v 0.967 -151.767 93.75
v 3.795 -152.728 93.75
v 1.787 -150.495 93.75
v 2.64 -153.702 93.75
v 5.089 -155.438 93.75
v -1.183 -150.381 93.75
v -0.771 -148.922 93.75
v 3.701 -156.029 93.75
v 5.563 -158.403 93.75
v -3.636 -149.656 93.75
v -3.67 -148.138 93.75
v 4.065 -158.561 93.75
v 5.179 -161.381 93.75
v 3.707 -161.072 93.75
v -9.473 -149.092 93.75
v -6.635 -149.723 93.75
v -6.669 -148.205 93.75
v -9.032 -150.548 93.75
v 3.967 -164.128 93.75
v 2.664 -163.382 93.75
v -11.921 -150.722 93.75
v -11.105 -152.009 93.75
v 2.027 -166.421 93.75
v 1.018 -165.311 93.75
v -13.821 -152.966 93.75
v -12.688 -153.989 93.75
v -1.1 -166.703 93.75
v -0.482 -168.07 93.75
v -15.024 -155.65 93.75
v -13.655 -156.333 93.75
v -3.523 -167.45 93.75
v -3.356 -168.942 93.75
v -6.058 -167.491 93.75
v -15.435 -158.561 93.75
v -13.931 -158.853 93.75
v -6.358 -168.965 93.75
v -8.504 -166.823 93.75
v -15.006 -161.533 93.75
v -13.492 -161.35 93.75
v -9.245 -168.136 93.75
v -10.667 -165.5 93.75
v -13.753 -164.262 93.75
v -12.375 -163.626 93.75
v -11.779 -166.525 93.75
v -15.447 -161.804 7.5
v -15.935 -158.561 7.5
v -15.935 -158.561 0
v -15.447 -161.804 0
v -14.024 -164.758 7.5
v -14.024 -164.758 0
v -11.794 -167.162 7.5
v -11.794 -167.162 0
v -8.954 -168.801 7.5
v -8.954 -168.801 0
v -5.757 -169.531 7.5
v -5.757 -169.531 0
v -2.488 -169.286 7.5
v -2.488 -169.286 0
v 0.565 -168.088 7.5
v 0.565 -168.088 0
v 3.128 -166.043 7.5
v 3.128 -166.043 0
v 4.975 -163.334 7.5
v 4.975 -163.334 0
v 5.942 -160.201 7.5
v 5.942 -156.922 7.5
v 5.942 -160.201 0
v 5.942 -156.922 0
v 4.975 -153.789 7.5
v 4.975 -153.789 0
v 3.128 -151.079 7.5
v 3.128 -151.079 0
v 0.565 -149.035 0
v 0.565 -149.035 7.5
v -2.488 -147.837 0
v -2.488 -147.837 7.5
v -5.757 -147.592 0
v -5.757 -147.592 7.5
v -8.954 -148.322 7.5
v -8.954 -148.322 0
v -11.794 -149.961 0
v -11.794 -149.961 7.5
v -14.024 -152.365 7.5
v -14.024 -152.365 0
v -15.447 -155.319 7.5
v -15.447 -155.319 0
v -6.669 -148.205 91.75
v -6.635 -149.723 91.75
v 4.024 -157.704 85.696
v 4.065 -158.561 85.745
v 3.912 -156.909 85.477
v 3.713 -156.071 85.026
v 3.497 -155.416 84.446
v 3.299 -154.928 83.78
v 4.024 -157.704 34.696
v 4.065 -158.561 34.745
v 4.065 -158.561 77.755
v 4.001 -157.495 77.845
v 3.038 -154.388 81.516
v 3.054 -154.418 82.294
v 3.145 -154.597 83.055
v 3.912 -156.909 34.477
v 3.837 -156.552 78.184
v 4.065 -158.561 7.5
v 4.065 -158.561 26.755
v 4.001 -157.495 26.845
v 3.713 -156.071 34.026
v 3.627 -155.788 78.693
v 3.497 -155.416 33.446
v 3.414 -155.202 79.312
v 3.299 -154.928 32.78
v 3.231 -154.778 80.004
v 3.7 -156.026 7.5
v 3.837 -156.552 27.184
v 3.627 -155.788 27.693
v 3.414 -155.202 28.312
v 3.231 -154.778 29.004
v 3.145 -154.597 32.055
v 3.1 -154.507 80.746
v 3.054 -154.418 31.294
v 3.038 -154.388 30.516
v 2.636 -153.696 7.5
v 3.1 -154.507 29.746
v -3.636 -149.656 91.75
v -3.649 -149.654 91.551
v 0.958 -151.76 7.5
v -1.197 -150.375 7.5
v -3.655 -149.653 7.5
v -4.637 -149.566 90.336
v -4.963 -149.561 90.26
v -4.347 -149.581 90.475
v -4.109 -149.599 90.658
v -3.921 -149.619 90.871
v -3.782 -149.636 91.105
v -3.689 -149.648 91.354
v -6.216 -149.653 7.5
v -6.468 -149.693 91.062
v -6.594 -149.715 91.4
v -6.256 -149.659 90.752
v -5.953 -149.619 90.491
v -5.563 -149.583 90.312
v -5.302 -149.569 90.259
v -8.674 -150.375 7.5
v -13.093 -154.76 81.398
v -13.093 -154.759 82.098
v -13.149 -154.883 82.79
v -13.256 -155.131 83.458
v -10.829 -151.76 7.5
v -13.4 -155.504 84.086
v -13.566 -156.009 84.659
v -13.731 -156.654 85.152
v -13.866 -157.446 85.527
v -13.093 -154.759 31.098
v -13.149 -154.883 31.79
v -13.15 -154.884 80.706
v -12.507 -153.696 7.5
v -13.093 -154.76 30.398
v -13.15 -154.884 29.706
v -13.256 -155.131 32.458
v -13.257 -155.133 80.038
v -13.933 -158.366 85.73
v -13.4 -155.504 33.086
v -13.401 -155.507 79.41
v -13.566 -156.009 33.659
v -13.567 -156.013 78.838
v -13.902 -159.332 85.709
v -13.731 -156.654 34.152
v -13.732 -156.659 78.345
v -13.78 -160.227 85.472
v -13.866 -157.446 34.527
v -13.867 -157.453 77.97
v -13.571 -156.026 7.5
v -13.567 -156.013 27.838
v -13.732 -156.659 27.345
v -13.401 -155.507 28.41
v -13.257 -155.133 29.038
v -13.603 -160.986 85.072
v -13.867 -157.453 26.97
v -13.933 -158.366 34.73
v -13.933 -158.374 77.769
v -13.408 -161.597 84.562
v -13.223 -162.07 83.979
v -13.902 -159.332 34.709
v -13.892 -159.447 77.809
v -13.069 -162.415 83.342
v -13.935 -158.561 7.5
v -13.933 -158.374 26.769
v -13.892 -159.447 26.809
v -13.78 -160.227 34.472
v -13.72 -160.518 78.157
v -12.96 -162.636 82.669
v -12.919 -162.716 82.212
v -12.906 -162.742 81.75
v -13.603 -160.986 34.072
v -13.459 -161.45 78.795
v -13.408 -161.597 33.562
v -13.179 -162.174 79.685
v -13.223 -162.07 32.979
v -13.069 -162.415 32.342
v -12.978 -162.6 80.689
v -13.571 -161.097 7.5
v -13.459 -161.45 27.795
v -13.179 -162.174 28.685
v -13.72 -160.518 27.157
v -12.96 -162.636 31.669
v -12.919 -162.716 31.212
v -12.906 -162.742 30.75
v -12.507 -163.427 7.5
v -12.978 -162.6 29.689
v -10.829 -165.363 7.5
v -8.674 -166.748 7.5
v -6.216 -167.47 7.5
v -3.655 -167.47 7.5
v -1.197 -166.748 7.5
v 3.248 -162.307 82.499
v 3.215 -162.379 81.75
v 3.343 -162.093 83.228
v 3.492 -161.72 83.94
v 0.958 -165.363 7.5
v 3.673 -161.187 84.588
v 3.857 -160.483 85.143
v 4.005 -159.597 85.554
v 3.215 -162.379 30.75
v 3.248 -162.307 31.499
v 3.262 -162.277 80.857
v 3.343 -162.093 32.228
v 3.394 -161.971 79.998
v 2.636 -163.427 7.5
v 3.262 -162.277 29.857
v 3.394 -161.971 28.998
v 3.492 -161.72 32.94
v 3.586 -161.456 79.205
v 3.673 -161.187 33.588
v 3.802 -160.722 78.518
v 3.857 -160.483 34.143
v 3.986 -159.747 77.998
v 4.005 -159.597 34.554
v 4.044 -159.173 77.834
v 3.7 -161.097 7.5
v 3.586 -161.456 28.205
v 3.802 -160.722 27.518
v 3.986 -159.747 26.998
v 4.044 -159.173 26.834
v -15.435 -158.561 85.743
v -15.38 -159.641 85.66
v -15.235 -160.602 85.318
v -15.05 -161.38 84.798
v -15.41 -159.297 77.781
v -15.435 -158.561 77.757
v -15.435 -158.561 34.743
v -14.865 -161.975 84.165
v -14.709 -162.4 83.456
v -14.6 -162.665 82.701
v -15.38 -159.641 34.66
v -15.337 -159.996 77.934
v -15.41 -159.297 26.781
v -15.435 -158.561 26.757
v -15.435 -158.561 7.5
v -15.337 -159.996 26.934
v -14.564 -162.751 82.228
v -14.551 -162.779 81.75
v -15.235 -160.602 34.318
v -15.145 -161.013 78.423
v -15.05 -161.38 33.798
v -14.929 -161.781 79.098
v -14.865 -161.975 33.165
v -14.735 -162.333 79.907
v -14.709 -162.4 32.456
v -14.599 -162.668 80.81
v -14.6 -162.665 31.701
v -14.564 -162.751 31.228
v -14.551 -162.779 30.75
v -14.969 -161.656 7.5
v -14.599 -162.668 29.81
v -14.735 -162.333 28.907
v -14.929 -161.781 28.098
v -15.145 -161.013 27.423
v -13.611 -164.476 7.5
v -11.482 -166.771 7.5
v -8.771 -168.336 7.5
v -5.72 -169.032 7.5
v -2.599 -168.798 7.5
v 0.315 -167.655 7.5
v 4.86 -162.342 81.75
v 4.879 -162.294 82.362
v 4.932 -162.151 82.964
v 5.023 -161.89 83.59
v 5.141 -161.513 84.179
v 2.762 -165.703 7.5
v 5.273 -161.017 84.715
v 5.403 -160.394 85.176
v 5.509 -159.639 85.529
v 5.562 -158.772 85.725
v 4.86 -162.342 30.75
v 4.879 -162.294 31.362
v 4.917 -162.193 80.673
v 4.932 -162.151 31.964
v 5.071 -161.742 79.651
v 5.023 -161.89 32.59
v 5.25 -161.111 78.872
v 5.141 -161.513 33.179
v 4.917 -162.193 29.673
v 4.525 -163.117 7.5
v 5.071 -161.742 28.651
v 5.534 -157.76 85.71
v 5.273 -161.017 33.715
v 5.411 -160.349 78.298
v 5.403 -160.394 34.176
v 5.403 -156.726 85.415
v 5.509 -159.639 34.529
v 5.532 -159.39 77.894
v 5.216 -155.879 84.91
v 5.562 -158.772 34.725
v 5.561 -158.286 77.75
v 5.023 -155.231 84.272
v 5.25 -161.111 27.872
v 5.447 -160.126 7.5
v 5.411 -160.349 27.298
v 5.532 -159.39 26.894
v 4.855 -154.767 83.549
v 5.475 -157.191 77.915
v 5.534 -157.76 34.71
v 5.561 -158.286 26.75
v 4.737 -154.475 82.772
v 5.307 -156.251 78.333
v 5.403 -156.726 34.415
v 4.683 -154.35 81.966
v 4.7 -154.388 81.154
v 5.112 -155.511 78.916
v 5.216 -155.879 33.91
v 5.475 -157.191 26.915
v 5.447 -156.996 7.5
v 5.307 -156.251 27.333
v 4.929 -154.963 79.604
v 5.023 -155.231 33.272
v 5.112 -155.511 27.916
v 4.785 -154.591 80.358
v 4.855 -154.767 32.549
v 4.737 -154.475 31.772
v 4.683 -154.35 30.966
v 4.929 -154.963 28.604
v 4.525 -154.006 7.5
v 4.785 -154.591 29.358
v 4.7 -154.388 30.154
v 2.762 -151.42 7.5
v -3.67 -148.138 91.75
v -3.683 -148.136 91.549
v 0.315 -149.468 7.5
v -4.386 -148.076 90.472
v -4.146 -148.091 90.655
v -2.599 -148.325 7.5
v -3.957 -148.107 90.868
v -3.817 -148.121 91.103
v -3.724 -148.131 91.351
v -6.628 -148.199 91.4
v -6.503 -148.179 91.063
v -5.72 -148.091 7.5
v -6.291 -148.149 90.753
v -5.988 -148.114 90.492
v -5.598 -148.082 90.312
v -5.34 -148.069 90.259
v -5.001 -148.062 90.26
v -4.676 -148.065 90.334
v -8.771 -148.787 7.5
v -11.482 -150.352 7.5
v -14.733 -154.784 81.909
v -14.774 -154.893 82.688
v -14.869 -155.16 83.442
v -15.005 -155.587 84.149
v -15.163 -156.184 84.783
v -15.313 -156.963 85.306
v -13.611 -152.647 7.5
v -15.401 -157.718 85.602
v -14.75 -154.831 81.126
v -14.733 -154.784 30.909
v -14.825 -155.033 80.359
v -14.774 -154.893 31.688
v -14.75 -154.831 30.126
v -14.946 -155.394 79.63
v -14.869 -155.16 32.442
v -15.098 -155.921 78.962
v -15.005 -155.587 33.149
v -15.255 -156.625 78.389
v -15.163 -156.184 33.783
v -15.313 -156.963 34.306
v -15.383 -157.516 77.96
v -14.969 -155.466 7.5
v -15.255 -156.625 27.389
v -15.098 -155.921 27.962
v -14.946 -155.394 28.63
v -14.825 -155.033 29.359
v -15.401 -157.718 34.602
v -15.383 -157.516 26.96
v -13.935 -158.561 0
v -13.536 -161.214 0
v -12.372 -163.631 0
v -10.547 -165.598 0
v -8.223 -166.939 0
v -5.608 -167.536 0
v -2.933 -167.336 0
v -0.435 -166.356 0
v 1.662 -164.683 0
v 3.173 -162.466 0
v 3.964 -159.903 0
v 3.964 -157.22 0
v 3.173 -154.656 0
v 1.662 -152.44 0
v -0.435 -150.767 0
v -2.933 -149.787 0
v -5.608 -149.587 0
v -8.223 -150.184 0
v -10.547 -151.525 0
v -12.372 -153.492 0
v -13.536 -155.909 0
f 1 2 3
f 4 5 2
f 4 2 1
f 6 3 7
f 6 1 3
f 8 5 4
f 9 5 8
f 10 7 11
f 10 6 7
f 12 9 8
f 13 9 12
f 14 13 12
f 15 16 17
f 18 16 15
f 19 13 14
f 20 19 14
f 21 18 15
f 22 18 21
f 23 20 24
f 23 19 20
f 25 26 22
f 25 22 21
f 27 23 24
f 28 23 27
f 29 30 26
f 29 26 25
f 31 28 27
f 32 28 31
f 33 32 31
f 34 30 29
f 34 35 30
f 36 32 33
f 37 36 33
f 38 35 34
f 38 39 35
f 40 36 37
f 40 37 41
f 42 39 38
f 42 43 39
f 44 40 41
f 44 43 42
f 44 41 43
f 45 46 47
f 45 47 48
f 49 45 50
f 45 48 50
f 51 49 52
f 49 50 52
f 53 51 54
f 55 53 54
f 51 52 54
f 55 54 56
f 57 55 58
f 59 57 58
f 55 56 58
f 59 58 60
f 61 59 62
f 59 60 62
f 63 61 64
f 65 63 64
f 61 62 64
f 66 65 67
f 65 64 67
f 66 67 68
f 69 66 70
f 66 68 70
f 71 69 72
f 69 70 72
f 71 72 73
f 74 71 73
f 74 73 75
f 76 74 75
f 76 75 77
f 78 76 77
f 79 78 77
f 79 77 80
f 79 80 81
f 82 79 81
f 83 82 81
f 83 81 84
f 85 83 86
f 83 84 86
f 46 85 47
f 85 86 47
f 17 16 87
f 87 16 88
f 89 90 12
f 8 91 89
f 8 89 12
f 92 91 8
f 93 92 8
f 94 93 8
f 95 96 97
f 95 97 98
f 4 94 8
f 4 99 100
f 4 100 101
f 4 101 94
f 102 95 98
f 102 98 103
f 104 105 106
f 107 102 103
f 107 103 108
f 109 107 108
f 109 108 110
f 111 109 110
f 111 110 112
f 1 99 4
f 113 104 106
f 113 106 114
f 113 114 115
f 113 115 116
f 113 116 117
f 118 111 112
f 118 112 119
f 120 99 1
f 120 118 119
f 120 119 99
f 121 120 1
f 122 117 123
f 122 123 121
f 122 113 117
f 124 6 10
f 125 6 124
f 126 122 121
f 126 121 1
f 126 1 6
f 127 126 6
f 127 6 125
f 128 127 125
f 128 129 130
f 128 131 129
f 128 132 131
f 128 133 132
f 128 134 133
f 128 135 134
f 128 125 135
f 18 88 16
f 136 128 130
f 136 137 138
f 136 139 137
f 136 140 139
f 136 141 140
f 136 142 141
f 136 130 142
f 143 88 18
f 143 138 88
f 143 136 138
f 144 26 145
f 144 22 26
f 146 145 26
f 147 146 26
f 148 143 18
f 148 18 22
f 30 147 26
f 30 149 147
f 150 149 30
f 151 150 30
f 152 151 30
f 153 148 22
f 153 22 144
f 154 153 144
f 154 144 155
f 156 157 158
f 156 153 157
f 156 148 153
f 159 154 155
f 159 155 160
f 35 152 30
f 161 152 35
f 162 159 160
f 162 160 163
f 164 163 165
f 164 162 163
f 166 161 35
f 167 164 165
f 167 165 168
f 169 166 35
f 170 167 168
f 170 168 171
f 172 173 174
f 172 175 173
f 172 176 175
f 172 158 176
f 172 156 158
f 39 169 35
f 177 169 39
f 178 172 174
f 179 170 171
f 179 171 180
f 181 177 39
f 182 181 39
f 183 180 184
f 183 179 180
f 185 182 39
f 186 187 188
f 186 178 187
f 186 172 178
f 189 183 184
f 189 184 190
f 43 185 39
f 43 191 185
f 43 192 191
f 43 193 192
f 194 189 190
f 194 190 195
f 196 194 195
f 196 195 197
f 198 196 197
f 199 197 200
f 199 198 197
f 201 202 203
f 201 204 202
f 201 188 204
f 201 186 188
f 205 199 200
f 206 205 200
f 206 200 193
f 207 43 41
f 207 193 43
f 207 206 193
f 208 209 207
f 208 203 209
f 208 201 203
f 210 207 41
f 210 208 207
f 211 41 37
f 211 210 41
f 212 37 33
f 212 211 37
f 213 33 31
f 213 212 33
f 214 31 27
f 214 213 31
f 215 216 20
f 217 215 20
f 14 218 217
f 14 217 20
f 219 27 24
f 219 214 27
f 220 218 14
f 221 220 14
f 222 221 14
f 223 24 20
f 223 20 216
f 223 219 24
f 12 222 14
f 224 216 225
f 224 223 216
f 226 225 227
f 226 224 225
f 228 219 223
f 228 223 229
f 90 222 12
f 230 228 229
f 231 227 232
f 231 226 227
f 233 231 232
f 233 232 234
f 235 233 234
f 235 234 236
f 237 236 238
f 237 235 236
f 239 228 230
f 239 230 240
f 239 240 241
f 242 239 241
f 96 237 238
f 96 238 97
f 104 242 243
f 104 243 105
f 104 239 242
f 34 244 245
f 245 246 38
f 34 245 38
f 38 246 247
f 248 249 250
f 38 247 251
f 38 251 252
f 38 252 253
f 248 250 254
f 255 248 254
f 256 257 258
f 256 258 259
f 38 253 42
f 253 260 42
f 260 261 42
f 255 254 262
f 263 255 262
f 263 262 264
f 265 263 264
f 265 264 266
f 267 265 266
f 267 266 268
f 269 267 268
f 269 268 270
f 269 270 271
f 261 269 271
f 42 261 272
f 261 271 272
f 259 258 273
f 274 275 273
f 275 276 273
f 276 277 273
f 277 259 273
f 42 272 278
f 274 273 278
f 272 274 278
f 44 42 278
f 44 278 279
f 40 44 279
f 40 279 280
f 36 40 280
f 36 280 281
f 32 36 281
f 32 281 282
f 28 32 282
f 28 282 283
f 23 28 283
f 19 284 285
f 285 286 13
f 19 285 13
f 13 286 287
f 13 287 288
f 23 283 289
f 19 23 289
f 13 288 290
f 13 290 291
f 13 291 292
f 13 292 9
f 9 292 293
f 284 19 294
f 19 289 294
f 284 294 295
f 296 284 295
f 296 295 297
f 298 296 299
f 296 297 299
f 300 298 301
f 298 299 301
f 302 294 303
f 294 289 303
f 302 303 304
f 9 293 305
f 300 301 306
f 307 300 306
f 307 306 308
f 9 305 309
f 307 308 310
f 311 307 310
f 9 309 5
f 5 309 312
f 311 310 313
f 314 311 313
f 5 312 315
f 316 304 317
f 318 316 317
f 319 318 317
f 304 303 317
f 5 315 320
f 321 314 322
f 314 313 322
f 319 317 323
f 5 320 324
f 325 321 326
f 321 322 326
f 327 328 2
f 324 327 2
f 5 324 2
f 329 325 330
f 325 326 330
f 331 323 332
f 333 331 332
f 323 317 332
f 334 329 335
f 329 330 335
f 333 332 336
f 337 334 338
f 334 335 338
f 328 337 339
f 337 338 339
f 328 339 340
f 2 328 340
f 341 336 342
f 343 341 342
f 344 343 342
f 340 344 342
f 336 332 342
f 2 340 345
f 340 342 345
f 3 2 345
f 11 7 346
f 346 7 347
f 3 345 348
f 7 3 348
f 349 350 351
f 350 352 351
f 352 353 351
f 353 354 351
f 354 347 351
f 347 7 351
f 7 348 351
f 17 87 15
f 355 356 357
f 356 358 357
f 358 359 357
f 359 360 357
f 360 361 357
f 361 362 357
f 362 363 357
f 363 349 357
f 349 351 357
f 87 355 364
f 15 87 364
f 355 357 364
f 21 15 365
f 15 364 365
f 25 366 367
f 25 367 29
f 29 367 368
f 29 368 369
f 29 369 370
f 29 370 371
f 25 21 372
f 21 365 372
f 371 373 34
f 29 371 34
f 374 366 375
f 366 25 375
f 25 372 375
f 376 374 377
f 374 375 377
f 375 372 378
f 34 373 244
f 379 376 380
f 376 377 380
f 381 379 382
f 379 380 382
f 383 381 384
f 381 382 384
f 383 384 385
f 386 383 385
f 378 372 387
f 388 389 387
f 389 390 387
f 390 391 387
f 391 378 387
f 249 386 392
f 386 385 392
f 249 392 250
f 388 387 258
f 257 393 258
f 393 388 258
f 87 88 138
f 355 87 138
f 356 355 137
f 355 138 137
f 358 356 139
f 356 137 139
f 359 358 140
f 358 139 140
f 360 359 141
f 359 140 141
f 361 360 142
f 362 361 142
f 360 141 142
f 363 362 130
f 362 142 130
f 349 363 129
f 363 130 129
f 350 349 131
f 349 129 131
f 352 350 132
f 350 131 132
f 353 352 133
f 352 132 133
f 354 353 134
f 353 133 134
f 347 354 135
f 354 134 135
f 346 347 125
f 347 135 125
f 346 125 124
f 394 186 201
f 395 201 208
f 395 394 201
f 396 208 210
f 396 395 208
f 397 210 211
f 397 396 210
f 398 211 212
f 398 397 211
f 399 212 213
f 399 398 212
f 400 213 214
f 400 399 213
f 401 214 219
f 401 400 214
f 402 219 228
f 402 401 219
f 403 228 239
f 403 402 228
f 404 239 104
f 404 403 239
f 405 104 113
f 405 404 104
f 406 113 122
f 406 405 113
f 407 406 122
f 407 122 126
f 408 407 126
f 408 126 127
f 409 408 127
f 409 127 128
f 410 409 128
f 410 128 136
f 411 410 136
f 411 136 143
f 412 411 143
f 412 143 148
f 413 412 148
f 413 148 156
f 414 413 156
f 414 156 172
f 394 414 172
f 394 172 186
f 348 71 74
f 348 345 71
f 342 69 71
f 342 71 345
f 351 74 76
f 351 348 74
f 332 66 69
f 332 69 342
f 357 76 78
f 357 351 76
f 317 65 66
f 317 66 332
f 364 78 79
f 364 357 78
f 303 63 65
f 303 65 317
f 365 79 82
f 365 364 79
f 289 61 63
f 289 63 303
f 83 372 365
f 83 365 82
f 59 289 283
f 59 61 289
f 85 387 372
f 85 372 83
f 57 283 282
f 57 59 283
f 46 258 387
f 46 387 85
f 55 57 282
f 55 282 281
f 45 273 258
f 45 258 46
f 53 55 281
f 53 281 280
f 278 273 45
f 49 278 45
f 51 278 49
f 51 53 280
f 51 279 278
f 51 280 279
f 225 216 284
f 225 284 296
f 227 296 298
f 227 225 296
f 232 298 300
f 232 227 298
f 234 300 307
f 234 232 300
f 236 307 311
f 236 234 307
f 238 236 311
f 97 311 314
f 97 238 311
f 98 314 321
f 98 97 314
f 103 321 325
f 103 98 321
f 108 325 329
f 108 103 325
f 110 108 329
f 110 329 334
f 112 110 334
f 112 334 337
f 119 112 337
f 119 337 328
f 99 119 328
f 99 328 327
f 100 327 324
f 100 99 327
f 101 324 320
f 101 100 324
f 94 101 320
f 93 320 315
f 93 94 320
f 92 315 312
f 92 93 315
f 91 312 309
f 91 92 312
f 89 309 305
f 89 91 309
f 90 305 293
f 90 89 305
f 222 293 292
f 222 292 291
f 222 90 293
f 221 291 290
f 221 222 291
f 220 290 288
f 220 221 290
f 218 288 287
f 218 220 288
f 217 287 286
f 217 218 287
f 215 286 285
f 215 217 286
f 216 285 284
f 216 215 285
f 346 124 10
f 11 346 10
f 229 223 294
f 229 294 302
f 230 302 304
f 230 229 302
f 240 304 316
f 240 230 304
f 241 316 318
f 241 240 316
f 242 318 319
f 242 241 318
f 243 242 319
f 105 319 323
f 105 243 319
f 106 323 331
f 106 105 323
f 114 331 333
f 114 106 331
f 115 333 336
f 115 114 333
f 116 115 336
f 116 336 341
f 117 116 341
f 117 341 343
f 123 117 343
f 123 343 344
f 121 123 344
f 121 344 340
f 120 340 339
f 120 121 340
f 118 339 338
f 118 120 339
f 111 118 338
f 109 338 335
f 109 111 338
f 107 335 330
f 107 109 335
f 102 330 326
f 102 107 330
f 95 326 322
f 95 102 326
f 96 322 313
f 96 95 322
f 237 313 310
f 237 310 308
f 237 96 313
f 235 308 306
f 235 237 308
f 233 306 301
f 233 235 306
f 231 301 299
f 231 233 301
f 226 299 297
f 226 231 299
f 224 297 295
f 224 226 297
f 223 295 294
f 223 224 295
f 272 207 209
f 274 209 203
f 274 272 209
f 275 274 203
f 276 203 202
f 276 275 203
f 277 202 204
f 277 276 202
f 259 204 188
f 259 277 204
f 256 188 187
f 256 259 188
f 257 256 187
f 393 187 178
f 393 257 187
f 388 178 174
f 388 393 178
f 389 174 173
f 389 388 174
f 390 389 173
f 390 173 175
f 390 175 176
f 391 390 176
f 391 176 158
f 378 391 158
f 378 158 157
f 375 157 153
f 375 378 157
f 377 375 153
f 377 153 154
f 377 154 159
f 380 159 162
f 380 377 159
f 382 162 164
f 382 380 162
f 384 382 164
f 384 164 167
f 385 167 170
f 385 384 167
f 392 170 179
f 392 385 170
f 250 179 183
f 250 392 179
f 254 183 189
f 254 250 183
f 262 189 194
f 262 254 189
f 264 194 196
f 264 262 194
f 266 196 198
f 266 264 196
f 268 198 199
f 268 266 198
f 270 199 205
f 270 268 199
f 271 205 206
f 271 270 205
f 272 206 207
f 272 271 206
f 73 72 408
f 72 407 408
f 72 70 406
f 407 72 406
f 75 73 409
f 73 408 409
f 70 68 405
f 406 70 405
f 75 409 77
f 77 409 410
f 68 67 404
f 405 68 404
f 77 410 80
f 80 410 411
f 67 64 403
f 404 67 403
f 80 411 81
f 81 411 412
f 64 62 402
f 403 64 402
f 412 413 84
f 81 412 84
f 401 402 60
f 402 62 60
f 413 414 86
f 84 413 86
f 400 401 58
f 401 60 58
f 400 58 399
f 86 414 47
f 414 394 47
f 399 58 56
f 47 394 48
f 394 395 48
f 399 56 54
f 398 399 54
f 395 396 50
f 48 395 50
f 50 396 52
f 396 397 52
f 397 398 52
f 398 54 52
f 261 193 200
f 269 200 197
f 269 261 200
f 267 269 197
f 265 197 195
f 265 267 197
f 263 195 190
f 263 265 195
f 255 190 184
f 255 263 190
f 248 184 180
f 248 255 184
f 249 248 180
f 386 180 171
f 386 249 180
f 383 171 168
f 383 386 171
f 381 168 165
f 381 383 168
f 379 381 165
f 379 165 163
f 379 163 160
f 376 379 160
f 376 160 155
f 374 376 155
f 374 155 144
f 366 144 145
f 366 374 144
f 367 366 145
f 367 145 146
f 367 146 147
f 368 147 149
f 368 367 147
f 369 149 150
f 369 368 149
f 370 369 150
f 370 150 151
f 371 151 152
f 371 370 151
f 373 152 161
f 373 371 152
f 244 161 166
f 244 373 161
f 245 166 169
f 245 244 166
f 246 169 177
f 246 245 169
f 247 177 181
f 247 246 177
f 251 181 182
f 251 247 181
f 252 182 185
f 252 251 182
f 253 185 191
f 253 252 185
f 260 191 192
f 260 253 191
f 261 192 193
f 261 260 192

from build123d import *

# Parameters (mm, degrees)
SKETCH_1_R               = 11
SKETCH_1_R_2             = 9
EXTRUDE_1_DEPTH          = 7.5
SKETCH_3_R               = 10.5
SKETCH_3_R_2             = 9
EXTRUDE_2_DEPTH          = 86.25
CUT_EXTRUDE_1_DEPTH      = 86.25
CUT_EXTRUDE_1_DEPTH_BACK = 86.25
SKETCH_4_R               = 4
CUT_EXTRUDE_2_DEPTH      = 35.25


with BuildPart() as part:
    # 草图1 → 凸台-拉伸1 (new body)
    with BuildSketch(Plane.XY):
        with Locations(Location((-4.935418671, -158.561383044, 0), (0, 0, 180))):
            Circle(SKETCH_1_R)
        with Locations(Location((-4.935418671, -158.561383044, 0), (0, 0, 180))):
            Circle(SKETCH_1_R_2, mode=Mode.SUBTRACT)
    extrude(amount=EXTRUDE_1_DEPTH)

    # 草图3 → 凸台-拉伸2 (add)
    with BuildSketch(Plane.XY.offset(7.5)):
        with Locations(Location((-4.935418671, -158.561383044, 0), (0, 0, 180))):
            Circle(SKETCH_3_R)
        with Locations((-4.935418671, -158.561383044)):
            Circle(SKETCH_3_R_2, mode=Mode.SUBTRACT)
    extrude(amount=EXTRUDE_2_DEPTH)

    # 草图4 → 切除-拉伸1 (cut, two sides: drawn at the far end of the back side and taken through both)
    with BuildSketch(Plane(origin=(-8.503036589, -0.191549015, 0), x_dir=(0, 0, -1), z_dir=(0.9997463607277357, 0.022521416732707692, -5.695444116327053e-14)).offset(-CUT_EXTRUDE_1_DEPTH_BACK)):
        with Locations(Location((-81.75, -158.41001303, 0), (0, 0, 270))):
            Circle(SKETCH_4_R)
        with Locations(Location((-30.75, -158.41001303, 0), (0, 0, 270))):
            Circle(SKETCH_4_R)
    extrude(amount=CUT_EXTRUDE_1_DEPTH + CUT_EXTRUDE_1_DEPTH_BACK, mode=Mode.SUBTRACT)

    # 草图5 → 切除-拉伸2 (cut)
    with BuildSketch(Plane(origin=(3.567617918, -158.369834029, 0), x_dir=(0.9997463607277357, 0.022521416732707685, 0), z_dir=(-0.022521416732707685, 0.9997463607277357, 0))):
        with BuildLine():
            Line((-10.00519384, -93.75), (-10.00519384, -91.75))
            ThreePointArc((-10.00519384, -91.75), (-8.50519384, -90.25), (-7.00519384, -91.75))
            Line((-7.00519384, -91.75), (-7.00519384, -93.75))
            ThreePointArc((-7.00519384, -93.75), (-8.50519384, -95.25), (-10.00519384, -93.75))
        make_face()
    extrude(amount=CUT_EXTRUDE_2_DEPTH, mode=Mode.SUBTRACT)


solid = part.part
